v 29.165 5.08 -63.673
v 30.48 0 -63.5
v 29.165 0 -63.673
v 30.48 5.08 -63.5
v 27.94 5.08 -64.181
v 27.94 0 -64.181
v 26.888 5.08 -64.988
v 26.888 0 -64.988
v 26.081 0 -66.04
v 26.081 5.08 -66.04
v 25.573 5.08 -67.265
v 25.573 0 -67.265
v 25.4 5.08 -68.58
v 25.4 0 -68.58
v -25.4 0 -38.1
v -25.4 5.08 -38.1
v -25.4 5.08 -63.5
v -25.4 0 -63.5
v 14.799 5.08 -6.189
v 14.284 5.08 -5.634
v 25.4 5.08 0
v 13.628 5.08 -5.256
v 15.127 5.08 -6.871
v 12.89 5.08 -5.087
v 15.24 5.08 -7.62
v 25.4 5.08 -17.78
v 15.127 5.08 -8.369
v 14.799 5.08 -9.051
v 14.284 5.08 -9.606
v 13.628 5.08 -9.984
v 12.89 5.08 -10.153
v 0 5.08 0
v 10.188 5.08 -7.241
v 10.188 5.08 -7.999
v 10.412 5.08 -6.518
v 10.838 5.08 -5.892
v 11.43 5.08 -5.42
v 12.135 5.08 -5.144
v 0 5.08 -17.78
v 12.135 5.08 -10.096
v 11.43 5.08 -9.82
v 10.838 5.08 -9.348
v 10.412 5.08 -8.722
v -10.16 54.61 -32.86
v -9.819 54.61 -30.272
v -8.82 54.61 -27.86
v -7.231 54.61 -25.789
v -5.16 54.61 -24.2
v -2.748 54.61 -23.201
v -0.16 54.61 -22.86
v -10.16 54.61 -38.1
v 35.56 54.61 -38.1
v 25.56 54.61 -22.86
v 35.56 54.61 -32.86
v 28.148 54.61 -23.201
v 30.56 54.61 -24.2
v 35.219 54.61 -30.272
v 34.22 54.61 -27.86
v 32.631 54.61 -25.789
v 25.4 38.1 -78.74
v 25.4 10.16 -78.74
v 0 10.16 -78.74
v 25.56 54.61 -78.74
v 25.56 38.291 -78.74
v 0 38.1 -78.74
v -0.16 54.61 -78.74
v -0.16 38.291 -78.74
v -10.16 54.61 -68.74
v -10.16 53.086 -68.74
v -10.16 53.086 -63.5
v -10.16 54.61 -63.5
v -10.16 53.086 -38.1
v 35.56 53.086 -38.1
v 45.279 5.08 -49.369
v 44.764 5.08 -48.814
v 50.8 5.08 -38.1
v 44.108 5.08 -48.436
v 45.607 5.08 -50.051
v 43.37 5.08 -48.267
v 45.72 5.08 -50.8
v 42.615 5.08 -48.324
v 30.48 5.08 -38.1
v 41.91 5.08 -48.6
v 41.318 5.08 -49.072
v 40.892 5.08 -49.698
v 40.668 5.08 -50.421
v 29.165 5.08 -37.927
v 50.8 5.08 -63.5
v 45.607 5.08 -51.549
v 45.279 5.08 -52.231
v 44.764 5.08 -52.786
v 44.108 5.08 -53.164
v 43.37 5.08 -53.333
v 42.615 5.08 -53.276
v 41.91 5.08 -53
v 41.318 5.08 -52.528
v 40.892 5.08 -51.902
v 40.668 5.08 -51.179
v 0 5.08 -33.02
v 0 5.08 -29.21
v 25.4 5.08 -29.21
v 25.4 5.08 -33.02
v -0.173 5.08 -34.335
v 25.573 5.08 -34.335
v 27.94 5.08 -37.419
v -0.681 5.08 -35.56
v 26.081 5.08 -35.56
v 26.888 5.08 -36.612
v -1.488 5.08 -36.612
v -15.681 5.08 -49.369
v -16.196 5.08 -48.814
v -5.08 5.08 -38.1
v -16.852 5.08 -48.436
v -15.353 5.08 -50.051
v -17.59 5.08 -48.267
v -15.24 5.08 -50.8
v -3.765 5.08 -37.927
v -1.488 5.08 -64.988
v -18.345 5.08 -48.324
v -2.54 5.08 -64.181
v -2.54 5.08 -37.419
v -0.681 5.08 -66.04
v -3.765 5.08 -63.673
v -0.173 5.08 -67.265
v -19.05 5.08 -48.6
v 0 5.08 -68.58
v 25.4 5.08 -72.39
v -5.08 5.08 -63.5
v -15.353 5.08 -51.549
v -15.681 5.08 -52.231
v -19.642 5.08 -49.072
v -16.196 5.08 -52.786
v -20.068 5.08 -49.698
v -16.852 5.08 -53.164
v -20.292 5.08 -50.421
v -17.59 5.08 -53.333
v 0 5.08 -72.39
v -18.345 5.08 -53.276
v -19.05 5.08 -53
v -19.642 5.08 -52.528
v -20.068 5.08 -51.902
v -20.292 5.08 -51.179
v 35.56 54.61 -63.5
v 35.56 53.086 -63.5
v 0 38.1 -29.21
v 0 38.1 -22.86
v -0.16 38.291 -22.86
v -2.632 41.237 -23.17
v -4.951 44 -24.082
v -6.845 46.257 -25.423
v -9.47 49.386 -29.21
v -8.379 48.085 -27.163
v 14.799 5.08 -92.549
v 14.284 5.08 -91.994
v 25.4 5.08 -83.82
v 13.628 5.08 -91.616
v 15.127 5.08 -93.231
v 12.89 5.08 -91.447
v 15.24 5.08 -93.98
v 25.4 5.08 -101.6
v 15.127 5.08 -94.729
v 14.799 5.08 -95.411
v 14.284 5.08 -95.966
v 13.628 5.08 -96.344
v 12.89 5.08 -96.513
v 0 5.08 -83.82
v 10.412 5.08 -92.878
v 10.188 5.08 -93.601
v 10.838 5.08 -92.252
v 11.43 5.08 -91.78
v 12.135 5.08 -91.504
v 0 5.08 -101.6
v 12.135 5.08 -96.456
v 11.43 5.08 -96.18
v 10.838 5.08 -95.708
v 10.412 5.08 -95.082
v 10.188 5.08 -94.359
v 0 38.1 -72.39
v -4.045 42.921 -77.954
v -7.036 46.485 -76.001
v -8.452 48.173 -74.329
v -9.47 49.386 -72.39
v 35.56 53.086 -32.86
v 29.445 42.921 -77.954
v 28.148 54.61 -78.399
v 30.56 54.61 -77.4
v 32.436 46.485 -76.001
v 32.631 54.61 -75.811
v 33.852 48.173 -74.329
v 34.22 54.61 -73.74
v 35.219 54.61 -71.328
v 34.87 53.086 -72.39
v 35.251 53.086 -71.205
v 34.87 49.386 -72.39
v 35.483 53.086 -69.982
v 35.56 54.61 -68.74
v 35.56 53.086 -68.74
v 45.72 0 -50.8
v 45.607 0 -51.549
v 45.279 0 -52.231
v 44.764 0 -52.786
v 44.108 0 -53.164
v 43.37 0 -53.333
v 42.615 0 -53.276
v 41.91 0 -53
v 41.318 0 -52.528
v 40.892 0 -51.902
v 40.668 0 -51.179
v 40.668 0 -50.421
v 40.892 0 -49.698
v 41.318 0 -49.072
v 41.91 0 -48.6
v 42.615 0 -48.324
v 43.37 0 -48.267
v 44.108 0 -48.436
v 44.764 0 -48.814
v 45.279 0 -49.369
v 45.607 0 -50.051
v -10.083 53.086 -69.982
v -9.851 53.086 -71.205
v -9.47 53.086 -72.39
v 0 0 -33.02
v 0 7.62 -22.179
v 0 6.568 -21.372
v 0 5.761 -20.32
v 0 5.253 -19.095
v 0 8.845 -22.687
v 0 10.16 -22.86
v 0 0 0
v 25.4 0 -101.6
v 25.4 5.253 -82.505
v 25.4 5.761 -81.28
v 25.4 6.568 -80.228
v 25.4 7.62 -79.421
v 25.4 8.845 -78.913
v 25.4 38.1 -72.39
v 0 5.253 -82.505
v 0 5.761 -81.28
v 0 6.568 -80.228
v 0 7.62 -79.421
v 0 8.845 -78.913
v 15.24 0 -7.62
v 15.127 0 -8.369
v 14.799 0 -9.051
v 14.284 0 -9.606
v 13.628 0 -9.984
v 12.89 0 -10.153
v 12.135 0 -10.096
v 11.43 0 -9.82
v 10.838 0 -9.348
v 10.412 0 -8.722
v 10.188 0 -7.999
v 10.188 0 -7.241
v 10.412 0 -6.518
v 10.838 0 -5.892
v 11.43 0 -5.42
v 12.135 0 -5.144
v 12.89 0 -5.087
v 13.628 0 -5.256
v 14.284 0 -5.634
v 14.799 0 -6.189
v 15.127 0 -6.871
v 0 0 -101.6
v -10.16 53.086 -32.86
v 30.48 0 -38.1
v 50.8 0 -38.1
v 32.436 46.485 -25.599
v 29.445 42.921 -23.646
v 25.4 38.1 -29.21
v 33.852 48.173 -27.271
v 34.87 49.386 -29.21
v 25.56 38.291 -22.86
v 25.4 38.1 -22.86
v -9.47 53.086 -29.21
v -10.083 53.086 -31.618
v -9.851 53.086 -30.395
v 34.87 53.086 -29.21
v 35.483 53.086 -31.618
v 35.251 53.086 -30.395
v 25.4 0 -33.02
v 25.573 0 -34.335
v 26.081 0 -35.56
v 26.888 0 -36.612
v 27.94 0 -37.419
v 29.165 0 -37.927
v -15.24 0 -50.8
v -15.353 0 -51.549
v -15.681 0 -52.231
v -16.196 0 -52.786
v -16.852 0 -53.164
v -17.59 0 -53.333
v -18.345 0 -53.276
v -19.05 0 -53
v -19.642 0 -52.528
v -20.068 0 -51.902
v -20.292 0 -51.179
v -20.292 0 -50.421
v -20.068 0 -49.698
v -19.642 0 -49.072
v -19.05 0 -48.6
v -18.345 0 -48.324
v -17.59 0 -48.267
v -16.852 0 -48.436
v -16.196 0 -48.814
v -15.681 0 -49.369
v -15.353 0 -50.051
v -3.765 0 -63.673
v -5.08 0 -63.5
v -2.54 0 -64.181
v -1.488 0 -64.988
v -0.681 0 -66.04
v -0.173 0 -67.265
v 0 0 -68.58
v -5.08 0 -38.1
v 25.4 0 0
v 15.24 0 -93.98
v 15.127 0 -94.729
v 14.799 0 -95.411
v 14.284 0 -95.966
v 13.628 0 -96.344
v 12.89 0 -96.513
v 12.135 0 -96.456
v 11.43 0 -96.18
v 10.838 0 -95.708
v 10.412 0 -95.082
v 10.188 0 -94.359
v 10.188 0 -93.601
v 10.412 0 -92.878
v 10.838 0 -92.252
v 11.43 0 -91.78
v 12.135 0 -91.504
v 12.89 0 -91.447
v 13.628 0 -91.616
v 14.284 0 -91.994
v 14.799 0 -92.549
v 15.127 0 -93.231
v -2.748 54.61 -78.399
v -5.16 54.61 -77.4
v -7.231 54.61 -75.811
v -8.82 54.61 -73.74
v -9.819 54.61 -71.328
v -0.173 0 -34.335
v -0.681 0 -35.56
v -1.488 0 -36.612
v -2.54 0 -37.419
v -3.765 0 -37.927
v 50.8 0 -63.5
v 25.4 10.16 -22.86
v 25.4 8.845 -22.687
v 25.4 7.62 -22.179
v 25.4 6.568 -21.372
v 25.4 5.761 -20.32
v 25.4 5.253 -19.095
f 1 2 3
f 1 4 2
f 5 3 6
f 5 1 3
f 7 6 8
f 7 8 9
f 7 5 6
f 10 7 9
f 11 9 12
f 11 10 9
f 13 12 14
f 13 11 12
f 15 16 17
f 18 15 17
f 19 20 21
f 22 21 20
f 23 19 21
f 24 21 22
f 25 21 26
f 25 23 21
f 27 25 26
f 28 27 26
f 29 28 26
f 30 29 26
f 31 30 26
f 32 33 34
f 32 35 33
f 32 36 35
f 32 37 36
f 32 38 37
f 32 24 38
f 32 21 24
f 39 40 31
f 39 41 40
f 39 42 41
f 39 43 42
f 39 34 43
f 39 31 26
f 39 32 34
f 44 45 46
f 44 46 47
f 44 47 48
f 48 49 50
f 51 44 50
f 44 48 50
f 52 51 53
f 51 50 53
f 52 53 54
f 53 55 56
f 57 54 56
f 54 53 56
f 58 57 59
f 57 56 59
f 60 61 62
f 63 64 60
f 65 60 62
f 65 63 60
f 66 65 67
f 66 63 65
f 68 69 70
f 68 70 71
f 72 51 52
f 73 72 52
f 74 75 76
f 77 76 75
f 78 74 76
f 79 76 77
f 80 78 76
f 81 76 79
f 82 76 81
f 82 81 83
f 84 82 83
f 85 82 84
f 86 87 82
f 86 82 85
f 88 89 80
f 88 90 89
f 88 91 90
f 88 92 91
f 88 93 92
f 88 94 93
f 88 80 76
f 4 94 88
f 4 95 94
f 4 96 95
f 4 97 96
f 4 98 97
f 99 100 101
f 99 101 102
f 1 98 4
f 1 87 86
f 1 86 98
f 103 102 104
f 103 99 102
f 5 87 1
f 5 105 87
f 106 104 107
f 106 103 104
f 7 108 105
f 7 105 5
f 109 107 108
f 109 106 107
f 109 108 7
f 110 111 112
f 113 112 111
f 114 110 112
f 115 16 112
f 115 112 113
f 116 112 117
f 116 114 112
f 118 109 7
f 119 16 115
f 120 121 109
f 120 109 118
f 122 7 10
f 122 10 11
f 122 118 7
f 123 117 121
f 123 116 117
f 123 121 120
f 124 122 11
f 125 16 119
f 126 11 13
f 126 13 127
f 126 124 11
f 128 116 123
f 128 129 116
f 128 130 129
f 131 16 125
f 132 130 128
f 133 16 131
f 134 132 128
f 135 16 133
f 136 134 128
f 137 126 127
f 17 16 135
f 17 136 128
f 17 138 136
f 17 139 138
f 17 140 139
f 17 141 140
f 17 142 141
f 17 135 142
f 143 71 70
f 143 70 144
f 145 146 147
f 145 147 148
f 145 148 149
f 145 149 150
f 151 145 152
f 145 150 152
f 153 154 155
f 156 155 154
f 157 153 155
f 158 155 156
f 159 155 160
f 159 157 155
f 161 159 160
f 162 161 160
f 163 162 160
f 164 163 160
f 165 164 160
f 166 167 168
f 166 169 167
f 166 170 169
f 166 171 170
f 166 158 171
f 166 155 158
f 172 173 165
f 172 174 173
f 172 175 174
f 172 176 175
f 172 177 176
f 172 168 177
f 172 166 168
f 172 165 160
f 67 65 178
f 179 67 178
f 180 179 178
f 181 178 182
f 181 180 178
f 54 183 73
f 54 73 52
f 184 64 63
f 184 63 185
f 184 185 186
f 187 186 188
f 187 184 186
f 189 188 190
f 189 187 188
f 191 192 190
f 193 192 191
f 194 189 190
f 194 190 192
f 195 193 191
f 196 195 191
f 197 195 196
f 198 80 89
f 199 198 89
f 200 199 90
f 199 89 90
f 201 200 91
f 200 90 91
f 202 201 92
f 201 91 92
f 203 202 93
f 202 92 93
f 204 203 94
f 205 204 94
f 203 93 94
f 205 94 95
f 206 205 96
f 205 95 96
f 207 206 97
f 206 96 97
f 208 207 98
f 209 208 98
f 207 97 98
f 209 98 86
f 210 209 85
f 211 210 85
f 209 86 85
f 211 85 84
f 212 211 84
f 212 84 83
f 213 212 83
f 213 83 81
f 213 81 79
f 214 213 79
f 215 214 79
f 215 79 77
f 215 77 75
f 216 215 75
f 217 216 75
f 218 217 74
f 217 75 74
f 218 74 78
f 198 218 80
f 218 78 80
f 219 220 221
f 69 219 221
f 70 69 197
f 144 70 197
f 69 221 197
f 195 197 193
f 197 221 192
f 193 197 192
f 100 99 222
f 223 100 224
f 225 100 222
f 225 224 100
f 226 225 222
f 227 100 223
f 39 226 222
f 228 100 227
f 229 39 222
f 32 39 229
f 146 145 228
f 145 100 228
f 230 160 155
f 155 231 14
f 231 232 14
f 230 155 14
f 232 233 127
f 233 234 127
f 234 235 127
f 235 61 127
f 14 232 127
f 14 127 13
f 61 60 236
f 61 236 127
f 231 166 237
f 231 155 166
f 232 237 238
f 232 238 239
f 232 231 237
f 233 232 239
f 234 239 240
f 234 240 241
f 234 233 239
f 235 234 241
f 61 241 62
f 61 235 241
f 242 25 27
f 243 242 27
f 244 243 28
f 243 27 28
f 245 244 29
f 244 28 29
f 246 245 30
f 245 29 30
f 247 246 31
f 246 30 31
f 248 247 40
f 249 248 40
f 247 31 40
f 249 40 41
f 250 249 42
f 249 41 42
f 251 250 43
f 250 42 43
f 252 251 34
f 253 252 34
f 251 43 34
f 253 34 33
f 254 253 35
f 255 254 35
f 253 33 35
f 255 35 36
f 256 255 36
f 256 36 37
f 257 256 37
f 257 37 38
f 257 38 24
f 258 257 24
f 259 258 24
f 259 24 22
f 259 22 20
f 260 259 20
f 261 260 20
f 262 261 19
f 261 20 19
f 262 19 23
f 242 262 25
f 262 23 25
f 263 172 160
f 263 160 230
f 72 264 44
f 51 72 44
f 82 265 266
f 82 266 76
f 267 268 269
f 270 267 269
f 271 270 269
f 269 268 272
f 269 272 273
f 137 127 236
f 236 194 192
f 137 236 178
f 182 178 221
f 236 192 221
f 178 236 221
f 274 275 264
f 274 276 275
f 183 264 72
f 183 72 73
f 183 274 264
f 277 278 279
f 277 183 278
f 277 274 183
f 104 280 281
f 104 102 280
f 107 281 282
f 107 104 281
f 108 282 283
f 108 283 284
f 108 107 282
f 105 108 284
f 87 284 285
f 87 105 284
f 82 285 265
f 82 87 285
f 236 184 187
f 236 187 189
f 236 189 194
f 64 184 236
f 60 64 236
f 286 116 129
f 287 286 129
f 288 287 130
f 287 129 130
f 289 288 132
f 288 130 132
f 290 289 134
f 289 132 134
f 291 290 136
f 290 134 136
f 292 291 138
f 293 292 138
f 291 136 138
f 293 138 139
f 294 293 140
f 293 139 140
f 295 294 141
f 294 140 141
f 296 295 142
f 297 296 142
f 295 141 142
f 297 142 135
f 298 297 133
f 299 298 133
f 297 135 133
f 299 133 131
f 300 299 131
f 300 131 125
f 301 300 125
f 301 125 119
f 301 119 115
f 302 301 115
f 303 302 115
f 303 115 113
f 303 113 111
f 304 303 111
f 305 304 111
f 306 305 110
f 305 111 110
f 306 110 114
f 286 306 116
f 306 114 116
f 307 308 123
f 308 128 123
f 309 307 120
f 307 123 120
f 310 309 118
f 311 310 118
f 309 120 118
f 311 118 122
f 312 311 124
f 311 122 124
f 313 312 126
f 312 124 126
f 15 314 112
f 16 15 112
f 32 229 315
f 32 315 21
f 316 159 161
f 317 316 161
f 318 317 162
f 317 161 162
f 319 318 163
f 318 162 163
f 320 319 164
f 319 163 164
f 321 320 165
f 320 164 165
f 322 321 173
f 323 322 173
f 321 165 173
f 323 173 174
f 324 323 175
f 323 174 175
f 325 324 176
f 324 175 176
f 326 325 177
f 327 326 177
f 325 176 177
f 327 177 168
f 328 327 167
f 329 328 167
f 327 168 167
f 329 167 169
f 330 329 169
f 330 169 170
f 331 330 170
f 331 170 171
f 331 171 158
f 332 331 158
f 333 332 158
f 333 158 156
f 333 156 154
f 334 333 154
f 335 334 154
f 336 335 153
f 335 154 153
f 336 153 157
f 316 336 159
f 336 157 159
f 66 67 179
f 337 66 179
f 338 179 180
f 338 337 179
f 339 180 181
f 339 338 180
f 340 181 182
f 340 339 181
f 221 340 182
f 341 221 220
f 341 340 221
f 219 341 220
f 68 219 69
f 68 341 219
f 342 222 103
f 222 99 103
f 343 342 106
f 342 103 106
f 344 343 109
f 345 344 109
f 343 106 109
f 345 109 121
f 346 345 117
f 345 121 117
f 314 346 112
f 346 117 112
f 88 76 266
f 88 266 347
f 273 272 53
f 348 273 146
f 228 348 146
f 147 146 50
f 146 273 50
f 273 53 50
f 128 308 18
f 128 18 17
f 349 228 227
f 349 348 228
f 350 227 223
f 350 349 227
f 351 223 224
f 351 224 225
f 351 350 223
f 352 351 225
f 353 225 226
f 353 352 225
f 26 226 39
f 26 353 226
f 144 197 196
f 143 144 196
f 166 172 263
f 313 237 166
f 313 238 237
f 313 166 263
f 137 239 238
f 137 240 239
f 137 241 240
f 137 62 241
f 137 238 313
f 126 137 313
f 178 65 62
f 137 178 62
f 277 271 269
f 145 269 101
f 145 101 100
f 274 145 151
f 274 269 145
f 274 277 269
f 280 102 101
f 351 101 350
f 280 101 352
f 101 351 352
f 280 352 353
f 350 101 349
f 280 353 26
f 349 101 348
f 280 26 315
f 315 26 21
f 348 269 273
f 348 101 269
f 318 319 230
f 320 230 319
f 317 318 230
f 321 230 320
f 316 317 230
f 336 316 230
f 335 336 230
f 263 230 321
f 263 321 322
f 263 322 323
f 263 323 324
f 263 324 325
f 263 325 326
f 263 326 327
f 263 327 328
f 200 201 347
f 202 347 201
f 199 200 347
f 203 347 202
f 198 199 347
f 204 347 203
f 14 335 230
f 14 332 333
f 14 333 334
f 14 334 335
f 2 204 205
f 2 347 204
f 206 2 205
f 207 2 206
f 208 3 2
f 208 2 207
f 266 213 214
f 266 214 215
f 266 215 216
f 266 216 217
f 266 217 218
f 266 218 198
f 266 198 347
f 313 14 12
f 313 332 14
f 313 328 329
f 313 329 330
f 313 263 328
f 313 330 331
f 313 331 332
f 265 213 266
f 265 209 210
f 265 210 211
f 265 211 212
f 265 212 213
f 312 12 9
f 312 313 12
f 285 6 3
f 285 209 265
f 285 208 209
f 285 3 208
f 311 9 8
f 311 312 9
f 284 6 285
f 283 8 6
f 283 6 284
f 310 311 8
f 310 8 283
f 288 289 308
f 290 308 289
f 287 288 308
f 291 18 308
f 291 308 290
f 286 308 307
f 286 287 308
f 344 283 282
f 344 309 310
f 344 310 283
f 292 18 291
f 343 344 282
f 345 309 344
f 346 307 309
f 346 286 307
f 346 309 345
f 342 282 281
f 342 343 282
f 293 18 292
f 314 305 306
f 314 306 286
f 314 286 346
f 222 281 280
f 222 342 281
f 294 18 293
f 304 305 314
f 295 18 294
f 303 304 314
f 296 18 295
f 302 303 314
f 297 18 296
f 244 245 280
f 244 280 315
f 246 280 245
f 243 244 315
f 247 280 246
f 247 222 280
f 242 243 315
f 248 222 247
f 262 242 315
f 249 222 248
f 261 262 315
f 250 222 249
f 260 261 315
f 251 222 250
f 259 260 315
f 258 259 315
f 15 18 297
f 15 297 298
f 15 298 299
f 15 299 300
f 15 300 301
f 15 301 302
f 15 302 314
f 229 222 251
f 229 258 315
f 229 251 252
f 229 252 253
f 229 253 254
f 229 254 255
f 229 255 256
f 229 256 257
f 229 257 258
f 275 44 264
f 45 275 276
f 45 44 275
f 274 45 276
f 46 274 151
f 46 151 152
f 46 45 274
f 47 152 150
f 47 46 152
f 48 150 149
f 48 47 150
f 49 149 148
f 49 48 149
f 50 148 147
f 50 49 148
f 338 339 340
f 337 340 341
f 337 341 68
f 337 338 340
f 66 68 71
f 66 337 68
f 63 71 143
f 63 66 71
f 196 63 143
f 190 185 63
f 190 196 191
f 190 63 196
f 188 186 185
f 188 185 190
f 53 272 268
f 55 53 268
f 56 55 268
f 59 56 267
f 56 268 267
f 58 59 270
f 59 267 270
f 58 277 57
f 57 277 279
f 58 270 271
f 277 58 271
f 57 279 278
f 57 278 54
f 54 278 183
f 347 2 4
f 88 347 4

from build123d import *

# Parameters (mm, degrees)
BASE_DEPTH                = 25.4
BOSS_EXTRUDE1_DEPTH       = 6.35
BOSS_EXTRUDE2_DEPTH       = 6.35
SKETCH7_W                 = 45.72
SKETCH7_H                 = 1.524
BOSS_EXTRUDE3_DEPTH       = 8.89
SKETCH3_W                 = 25.4
SKETCH3_H                 = 5.08
FRONT_SCREW_SUPPORT_DEPTH = 25.4
SKETCH4_R                 = 2.54
CUT_EXTRUDE1_DEPTH        = 5.08
FILLET3_R                 = 10
FILLET4_R                 = 5.08


with BuildPart() as part:
    # Sketch1 → Base (new body)
    with BuildSketch(Plane(origin=(0, 0, 0), x_dir=(0, 0, -1), z_dir=(1, 0, 0))):
        Polygon((0, 0), (0, 5.08), (22.86, 5.08), (22.86, 52.07), (29.21, 52.07), (29.21, 5.08), (72.39, 5.08), (72.39, 52.07), (78.74, 52.07), (78.74, 5.08), (101.6, 5.08), (101.6, 0), align=None)
    extrude(amount=BASE_DEPTH)

    # Sketch5 → Boss-Extrude1 (add)
    with BuildSketch(Plane(origin=(0, 0, -78.74), x_dir=(-1, 0, 0), z_dir=(0, 0, -1))):
        Polygon((-35.56, 52.07), (-35.56, 50.208216501), (-25.4, 38.1), (-25.4, 52.07), (0, 52.07), (0, 38.1), (10.16, 50.208216501), (10.16, 52.07), (10.16, 54.61), (-35.56, 54.61), align=None)
    extrude(amount=-BOSS_EXTRUDE1_DEPTH)

    # Sketch6 → Boss-Extrude2 (add)
    with BuildSketch(Plane.XY.offset(-22.86)):
        Polygon((0, 52.07), (0, 38.1), (-10.16, 50.208216501), (-10.16, 54.61), (35.56, 54.61), (35.56, 50.208216501), (25.4, 38.1), (25.4, 52.07), align=None)
    extrude(amount=-BOSS_EXTRUDE2_DEPTH)

    # Sketch7 → Boss-Extrude3 (add)
    with BuildSketch(Plane.XY.offset(-72.39)):
        with Locations((12.7, 53.848)):
            Rectangle(SKETCH7_W, SKETCH7_H)
    boss_extrude3 = extrude(amount=BOSS_EXTRUDE3_DEPTH)

    # Mirror19: Boss-Extrude3 across plane
    add(boss_extrude3.mirror(Plane.XY.offset(-50.8)))

    # Sketch3 → Front Screw Support (add)
    with BuildSketch(Plane(origin=(25.4, 0, 0), x_dir=(0, 0, -1), z_dir=(1, 0, 0))):
        with Locations((50.8, 2.54)):
            Rectangle(SKETCH3_W, SKETCH3_H)
    front_screw_support = extrude(amount=FRONT_SCREW_SUPPORT_DEPTH)

    # Mirror3: Front Screw Support across plane
    add(front_screw_support.mirror(Plane(origin=(12.7, 0, 0), x_dir=(0, 0, 1), z_dir=(1, 0, 0))))

    # Sketch4 → Cut-Extrude1 (cut)
    with BuildSketch(Plane(origin=(0, 5.08, 0), x_dir=(1, 0, 0), z_dir=(0, 1, 0))):
        with Locations((-17.78, 50.8)):
            Circle(SKETCH4_R)
        with Locations((43.18, 50.8)):
            Circle(SKETCH4_R)
        with Locations((12.7, 93.98)):
            Circle(SKETCH4_R)
        with Locations((12.7, 7.62)):
            Circle(SKETCH4_R)
    extrude(amount=-CUT_EXTRUDE1_DEPTH, mode=Mode.SUBTRACT)

    # Fillet3
    fillet3_edges = [part.edges().sort_by_distance(p)[0] for p in [
        (35.56, 52.40910825, -78.74),
        (-10.16, 52.40910825, -78.74),
        (-10.16, 52.40910825, -22.86),
        (35.56, 52.40910825, -22.86),
    ]]
    fillet(fillet3_edges, radius=FILLET3_R)

    # Fillet4
    fillet4_edges = [part.edges().sort_by_distance(p)[0] for p in [
        (25.4, 2.54, -63.5),
        (25.4, 2.54, -38.1),
        (0, 2.54, -63.5),
        (0, 2.54, -38.1),
        (12.7, 5.08, -22.86),
        (12.7, 5.08, -78.74),
    ]]
    fillet(fillet4_edges, radius=FILLET4_R)


solid = part.part
